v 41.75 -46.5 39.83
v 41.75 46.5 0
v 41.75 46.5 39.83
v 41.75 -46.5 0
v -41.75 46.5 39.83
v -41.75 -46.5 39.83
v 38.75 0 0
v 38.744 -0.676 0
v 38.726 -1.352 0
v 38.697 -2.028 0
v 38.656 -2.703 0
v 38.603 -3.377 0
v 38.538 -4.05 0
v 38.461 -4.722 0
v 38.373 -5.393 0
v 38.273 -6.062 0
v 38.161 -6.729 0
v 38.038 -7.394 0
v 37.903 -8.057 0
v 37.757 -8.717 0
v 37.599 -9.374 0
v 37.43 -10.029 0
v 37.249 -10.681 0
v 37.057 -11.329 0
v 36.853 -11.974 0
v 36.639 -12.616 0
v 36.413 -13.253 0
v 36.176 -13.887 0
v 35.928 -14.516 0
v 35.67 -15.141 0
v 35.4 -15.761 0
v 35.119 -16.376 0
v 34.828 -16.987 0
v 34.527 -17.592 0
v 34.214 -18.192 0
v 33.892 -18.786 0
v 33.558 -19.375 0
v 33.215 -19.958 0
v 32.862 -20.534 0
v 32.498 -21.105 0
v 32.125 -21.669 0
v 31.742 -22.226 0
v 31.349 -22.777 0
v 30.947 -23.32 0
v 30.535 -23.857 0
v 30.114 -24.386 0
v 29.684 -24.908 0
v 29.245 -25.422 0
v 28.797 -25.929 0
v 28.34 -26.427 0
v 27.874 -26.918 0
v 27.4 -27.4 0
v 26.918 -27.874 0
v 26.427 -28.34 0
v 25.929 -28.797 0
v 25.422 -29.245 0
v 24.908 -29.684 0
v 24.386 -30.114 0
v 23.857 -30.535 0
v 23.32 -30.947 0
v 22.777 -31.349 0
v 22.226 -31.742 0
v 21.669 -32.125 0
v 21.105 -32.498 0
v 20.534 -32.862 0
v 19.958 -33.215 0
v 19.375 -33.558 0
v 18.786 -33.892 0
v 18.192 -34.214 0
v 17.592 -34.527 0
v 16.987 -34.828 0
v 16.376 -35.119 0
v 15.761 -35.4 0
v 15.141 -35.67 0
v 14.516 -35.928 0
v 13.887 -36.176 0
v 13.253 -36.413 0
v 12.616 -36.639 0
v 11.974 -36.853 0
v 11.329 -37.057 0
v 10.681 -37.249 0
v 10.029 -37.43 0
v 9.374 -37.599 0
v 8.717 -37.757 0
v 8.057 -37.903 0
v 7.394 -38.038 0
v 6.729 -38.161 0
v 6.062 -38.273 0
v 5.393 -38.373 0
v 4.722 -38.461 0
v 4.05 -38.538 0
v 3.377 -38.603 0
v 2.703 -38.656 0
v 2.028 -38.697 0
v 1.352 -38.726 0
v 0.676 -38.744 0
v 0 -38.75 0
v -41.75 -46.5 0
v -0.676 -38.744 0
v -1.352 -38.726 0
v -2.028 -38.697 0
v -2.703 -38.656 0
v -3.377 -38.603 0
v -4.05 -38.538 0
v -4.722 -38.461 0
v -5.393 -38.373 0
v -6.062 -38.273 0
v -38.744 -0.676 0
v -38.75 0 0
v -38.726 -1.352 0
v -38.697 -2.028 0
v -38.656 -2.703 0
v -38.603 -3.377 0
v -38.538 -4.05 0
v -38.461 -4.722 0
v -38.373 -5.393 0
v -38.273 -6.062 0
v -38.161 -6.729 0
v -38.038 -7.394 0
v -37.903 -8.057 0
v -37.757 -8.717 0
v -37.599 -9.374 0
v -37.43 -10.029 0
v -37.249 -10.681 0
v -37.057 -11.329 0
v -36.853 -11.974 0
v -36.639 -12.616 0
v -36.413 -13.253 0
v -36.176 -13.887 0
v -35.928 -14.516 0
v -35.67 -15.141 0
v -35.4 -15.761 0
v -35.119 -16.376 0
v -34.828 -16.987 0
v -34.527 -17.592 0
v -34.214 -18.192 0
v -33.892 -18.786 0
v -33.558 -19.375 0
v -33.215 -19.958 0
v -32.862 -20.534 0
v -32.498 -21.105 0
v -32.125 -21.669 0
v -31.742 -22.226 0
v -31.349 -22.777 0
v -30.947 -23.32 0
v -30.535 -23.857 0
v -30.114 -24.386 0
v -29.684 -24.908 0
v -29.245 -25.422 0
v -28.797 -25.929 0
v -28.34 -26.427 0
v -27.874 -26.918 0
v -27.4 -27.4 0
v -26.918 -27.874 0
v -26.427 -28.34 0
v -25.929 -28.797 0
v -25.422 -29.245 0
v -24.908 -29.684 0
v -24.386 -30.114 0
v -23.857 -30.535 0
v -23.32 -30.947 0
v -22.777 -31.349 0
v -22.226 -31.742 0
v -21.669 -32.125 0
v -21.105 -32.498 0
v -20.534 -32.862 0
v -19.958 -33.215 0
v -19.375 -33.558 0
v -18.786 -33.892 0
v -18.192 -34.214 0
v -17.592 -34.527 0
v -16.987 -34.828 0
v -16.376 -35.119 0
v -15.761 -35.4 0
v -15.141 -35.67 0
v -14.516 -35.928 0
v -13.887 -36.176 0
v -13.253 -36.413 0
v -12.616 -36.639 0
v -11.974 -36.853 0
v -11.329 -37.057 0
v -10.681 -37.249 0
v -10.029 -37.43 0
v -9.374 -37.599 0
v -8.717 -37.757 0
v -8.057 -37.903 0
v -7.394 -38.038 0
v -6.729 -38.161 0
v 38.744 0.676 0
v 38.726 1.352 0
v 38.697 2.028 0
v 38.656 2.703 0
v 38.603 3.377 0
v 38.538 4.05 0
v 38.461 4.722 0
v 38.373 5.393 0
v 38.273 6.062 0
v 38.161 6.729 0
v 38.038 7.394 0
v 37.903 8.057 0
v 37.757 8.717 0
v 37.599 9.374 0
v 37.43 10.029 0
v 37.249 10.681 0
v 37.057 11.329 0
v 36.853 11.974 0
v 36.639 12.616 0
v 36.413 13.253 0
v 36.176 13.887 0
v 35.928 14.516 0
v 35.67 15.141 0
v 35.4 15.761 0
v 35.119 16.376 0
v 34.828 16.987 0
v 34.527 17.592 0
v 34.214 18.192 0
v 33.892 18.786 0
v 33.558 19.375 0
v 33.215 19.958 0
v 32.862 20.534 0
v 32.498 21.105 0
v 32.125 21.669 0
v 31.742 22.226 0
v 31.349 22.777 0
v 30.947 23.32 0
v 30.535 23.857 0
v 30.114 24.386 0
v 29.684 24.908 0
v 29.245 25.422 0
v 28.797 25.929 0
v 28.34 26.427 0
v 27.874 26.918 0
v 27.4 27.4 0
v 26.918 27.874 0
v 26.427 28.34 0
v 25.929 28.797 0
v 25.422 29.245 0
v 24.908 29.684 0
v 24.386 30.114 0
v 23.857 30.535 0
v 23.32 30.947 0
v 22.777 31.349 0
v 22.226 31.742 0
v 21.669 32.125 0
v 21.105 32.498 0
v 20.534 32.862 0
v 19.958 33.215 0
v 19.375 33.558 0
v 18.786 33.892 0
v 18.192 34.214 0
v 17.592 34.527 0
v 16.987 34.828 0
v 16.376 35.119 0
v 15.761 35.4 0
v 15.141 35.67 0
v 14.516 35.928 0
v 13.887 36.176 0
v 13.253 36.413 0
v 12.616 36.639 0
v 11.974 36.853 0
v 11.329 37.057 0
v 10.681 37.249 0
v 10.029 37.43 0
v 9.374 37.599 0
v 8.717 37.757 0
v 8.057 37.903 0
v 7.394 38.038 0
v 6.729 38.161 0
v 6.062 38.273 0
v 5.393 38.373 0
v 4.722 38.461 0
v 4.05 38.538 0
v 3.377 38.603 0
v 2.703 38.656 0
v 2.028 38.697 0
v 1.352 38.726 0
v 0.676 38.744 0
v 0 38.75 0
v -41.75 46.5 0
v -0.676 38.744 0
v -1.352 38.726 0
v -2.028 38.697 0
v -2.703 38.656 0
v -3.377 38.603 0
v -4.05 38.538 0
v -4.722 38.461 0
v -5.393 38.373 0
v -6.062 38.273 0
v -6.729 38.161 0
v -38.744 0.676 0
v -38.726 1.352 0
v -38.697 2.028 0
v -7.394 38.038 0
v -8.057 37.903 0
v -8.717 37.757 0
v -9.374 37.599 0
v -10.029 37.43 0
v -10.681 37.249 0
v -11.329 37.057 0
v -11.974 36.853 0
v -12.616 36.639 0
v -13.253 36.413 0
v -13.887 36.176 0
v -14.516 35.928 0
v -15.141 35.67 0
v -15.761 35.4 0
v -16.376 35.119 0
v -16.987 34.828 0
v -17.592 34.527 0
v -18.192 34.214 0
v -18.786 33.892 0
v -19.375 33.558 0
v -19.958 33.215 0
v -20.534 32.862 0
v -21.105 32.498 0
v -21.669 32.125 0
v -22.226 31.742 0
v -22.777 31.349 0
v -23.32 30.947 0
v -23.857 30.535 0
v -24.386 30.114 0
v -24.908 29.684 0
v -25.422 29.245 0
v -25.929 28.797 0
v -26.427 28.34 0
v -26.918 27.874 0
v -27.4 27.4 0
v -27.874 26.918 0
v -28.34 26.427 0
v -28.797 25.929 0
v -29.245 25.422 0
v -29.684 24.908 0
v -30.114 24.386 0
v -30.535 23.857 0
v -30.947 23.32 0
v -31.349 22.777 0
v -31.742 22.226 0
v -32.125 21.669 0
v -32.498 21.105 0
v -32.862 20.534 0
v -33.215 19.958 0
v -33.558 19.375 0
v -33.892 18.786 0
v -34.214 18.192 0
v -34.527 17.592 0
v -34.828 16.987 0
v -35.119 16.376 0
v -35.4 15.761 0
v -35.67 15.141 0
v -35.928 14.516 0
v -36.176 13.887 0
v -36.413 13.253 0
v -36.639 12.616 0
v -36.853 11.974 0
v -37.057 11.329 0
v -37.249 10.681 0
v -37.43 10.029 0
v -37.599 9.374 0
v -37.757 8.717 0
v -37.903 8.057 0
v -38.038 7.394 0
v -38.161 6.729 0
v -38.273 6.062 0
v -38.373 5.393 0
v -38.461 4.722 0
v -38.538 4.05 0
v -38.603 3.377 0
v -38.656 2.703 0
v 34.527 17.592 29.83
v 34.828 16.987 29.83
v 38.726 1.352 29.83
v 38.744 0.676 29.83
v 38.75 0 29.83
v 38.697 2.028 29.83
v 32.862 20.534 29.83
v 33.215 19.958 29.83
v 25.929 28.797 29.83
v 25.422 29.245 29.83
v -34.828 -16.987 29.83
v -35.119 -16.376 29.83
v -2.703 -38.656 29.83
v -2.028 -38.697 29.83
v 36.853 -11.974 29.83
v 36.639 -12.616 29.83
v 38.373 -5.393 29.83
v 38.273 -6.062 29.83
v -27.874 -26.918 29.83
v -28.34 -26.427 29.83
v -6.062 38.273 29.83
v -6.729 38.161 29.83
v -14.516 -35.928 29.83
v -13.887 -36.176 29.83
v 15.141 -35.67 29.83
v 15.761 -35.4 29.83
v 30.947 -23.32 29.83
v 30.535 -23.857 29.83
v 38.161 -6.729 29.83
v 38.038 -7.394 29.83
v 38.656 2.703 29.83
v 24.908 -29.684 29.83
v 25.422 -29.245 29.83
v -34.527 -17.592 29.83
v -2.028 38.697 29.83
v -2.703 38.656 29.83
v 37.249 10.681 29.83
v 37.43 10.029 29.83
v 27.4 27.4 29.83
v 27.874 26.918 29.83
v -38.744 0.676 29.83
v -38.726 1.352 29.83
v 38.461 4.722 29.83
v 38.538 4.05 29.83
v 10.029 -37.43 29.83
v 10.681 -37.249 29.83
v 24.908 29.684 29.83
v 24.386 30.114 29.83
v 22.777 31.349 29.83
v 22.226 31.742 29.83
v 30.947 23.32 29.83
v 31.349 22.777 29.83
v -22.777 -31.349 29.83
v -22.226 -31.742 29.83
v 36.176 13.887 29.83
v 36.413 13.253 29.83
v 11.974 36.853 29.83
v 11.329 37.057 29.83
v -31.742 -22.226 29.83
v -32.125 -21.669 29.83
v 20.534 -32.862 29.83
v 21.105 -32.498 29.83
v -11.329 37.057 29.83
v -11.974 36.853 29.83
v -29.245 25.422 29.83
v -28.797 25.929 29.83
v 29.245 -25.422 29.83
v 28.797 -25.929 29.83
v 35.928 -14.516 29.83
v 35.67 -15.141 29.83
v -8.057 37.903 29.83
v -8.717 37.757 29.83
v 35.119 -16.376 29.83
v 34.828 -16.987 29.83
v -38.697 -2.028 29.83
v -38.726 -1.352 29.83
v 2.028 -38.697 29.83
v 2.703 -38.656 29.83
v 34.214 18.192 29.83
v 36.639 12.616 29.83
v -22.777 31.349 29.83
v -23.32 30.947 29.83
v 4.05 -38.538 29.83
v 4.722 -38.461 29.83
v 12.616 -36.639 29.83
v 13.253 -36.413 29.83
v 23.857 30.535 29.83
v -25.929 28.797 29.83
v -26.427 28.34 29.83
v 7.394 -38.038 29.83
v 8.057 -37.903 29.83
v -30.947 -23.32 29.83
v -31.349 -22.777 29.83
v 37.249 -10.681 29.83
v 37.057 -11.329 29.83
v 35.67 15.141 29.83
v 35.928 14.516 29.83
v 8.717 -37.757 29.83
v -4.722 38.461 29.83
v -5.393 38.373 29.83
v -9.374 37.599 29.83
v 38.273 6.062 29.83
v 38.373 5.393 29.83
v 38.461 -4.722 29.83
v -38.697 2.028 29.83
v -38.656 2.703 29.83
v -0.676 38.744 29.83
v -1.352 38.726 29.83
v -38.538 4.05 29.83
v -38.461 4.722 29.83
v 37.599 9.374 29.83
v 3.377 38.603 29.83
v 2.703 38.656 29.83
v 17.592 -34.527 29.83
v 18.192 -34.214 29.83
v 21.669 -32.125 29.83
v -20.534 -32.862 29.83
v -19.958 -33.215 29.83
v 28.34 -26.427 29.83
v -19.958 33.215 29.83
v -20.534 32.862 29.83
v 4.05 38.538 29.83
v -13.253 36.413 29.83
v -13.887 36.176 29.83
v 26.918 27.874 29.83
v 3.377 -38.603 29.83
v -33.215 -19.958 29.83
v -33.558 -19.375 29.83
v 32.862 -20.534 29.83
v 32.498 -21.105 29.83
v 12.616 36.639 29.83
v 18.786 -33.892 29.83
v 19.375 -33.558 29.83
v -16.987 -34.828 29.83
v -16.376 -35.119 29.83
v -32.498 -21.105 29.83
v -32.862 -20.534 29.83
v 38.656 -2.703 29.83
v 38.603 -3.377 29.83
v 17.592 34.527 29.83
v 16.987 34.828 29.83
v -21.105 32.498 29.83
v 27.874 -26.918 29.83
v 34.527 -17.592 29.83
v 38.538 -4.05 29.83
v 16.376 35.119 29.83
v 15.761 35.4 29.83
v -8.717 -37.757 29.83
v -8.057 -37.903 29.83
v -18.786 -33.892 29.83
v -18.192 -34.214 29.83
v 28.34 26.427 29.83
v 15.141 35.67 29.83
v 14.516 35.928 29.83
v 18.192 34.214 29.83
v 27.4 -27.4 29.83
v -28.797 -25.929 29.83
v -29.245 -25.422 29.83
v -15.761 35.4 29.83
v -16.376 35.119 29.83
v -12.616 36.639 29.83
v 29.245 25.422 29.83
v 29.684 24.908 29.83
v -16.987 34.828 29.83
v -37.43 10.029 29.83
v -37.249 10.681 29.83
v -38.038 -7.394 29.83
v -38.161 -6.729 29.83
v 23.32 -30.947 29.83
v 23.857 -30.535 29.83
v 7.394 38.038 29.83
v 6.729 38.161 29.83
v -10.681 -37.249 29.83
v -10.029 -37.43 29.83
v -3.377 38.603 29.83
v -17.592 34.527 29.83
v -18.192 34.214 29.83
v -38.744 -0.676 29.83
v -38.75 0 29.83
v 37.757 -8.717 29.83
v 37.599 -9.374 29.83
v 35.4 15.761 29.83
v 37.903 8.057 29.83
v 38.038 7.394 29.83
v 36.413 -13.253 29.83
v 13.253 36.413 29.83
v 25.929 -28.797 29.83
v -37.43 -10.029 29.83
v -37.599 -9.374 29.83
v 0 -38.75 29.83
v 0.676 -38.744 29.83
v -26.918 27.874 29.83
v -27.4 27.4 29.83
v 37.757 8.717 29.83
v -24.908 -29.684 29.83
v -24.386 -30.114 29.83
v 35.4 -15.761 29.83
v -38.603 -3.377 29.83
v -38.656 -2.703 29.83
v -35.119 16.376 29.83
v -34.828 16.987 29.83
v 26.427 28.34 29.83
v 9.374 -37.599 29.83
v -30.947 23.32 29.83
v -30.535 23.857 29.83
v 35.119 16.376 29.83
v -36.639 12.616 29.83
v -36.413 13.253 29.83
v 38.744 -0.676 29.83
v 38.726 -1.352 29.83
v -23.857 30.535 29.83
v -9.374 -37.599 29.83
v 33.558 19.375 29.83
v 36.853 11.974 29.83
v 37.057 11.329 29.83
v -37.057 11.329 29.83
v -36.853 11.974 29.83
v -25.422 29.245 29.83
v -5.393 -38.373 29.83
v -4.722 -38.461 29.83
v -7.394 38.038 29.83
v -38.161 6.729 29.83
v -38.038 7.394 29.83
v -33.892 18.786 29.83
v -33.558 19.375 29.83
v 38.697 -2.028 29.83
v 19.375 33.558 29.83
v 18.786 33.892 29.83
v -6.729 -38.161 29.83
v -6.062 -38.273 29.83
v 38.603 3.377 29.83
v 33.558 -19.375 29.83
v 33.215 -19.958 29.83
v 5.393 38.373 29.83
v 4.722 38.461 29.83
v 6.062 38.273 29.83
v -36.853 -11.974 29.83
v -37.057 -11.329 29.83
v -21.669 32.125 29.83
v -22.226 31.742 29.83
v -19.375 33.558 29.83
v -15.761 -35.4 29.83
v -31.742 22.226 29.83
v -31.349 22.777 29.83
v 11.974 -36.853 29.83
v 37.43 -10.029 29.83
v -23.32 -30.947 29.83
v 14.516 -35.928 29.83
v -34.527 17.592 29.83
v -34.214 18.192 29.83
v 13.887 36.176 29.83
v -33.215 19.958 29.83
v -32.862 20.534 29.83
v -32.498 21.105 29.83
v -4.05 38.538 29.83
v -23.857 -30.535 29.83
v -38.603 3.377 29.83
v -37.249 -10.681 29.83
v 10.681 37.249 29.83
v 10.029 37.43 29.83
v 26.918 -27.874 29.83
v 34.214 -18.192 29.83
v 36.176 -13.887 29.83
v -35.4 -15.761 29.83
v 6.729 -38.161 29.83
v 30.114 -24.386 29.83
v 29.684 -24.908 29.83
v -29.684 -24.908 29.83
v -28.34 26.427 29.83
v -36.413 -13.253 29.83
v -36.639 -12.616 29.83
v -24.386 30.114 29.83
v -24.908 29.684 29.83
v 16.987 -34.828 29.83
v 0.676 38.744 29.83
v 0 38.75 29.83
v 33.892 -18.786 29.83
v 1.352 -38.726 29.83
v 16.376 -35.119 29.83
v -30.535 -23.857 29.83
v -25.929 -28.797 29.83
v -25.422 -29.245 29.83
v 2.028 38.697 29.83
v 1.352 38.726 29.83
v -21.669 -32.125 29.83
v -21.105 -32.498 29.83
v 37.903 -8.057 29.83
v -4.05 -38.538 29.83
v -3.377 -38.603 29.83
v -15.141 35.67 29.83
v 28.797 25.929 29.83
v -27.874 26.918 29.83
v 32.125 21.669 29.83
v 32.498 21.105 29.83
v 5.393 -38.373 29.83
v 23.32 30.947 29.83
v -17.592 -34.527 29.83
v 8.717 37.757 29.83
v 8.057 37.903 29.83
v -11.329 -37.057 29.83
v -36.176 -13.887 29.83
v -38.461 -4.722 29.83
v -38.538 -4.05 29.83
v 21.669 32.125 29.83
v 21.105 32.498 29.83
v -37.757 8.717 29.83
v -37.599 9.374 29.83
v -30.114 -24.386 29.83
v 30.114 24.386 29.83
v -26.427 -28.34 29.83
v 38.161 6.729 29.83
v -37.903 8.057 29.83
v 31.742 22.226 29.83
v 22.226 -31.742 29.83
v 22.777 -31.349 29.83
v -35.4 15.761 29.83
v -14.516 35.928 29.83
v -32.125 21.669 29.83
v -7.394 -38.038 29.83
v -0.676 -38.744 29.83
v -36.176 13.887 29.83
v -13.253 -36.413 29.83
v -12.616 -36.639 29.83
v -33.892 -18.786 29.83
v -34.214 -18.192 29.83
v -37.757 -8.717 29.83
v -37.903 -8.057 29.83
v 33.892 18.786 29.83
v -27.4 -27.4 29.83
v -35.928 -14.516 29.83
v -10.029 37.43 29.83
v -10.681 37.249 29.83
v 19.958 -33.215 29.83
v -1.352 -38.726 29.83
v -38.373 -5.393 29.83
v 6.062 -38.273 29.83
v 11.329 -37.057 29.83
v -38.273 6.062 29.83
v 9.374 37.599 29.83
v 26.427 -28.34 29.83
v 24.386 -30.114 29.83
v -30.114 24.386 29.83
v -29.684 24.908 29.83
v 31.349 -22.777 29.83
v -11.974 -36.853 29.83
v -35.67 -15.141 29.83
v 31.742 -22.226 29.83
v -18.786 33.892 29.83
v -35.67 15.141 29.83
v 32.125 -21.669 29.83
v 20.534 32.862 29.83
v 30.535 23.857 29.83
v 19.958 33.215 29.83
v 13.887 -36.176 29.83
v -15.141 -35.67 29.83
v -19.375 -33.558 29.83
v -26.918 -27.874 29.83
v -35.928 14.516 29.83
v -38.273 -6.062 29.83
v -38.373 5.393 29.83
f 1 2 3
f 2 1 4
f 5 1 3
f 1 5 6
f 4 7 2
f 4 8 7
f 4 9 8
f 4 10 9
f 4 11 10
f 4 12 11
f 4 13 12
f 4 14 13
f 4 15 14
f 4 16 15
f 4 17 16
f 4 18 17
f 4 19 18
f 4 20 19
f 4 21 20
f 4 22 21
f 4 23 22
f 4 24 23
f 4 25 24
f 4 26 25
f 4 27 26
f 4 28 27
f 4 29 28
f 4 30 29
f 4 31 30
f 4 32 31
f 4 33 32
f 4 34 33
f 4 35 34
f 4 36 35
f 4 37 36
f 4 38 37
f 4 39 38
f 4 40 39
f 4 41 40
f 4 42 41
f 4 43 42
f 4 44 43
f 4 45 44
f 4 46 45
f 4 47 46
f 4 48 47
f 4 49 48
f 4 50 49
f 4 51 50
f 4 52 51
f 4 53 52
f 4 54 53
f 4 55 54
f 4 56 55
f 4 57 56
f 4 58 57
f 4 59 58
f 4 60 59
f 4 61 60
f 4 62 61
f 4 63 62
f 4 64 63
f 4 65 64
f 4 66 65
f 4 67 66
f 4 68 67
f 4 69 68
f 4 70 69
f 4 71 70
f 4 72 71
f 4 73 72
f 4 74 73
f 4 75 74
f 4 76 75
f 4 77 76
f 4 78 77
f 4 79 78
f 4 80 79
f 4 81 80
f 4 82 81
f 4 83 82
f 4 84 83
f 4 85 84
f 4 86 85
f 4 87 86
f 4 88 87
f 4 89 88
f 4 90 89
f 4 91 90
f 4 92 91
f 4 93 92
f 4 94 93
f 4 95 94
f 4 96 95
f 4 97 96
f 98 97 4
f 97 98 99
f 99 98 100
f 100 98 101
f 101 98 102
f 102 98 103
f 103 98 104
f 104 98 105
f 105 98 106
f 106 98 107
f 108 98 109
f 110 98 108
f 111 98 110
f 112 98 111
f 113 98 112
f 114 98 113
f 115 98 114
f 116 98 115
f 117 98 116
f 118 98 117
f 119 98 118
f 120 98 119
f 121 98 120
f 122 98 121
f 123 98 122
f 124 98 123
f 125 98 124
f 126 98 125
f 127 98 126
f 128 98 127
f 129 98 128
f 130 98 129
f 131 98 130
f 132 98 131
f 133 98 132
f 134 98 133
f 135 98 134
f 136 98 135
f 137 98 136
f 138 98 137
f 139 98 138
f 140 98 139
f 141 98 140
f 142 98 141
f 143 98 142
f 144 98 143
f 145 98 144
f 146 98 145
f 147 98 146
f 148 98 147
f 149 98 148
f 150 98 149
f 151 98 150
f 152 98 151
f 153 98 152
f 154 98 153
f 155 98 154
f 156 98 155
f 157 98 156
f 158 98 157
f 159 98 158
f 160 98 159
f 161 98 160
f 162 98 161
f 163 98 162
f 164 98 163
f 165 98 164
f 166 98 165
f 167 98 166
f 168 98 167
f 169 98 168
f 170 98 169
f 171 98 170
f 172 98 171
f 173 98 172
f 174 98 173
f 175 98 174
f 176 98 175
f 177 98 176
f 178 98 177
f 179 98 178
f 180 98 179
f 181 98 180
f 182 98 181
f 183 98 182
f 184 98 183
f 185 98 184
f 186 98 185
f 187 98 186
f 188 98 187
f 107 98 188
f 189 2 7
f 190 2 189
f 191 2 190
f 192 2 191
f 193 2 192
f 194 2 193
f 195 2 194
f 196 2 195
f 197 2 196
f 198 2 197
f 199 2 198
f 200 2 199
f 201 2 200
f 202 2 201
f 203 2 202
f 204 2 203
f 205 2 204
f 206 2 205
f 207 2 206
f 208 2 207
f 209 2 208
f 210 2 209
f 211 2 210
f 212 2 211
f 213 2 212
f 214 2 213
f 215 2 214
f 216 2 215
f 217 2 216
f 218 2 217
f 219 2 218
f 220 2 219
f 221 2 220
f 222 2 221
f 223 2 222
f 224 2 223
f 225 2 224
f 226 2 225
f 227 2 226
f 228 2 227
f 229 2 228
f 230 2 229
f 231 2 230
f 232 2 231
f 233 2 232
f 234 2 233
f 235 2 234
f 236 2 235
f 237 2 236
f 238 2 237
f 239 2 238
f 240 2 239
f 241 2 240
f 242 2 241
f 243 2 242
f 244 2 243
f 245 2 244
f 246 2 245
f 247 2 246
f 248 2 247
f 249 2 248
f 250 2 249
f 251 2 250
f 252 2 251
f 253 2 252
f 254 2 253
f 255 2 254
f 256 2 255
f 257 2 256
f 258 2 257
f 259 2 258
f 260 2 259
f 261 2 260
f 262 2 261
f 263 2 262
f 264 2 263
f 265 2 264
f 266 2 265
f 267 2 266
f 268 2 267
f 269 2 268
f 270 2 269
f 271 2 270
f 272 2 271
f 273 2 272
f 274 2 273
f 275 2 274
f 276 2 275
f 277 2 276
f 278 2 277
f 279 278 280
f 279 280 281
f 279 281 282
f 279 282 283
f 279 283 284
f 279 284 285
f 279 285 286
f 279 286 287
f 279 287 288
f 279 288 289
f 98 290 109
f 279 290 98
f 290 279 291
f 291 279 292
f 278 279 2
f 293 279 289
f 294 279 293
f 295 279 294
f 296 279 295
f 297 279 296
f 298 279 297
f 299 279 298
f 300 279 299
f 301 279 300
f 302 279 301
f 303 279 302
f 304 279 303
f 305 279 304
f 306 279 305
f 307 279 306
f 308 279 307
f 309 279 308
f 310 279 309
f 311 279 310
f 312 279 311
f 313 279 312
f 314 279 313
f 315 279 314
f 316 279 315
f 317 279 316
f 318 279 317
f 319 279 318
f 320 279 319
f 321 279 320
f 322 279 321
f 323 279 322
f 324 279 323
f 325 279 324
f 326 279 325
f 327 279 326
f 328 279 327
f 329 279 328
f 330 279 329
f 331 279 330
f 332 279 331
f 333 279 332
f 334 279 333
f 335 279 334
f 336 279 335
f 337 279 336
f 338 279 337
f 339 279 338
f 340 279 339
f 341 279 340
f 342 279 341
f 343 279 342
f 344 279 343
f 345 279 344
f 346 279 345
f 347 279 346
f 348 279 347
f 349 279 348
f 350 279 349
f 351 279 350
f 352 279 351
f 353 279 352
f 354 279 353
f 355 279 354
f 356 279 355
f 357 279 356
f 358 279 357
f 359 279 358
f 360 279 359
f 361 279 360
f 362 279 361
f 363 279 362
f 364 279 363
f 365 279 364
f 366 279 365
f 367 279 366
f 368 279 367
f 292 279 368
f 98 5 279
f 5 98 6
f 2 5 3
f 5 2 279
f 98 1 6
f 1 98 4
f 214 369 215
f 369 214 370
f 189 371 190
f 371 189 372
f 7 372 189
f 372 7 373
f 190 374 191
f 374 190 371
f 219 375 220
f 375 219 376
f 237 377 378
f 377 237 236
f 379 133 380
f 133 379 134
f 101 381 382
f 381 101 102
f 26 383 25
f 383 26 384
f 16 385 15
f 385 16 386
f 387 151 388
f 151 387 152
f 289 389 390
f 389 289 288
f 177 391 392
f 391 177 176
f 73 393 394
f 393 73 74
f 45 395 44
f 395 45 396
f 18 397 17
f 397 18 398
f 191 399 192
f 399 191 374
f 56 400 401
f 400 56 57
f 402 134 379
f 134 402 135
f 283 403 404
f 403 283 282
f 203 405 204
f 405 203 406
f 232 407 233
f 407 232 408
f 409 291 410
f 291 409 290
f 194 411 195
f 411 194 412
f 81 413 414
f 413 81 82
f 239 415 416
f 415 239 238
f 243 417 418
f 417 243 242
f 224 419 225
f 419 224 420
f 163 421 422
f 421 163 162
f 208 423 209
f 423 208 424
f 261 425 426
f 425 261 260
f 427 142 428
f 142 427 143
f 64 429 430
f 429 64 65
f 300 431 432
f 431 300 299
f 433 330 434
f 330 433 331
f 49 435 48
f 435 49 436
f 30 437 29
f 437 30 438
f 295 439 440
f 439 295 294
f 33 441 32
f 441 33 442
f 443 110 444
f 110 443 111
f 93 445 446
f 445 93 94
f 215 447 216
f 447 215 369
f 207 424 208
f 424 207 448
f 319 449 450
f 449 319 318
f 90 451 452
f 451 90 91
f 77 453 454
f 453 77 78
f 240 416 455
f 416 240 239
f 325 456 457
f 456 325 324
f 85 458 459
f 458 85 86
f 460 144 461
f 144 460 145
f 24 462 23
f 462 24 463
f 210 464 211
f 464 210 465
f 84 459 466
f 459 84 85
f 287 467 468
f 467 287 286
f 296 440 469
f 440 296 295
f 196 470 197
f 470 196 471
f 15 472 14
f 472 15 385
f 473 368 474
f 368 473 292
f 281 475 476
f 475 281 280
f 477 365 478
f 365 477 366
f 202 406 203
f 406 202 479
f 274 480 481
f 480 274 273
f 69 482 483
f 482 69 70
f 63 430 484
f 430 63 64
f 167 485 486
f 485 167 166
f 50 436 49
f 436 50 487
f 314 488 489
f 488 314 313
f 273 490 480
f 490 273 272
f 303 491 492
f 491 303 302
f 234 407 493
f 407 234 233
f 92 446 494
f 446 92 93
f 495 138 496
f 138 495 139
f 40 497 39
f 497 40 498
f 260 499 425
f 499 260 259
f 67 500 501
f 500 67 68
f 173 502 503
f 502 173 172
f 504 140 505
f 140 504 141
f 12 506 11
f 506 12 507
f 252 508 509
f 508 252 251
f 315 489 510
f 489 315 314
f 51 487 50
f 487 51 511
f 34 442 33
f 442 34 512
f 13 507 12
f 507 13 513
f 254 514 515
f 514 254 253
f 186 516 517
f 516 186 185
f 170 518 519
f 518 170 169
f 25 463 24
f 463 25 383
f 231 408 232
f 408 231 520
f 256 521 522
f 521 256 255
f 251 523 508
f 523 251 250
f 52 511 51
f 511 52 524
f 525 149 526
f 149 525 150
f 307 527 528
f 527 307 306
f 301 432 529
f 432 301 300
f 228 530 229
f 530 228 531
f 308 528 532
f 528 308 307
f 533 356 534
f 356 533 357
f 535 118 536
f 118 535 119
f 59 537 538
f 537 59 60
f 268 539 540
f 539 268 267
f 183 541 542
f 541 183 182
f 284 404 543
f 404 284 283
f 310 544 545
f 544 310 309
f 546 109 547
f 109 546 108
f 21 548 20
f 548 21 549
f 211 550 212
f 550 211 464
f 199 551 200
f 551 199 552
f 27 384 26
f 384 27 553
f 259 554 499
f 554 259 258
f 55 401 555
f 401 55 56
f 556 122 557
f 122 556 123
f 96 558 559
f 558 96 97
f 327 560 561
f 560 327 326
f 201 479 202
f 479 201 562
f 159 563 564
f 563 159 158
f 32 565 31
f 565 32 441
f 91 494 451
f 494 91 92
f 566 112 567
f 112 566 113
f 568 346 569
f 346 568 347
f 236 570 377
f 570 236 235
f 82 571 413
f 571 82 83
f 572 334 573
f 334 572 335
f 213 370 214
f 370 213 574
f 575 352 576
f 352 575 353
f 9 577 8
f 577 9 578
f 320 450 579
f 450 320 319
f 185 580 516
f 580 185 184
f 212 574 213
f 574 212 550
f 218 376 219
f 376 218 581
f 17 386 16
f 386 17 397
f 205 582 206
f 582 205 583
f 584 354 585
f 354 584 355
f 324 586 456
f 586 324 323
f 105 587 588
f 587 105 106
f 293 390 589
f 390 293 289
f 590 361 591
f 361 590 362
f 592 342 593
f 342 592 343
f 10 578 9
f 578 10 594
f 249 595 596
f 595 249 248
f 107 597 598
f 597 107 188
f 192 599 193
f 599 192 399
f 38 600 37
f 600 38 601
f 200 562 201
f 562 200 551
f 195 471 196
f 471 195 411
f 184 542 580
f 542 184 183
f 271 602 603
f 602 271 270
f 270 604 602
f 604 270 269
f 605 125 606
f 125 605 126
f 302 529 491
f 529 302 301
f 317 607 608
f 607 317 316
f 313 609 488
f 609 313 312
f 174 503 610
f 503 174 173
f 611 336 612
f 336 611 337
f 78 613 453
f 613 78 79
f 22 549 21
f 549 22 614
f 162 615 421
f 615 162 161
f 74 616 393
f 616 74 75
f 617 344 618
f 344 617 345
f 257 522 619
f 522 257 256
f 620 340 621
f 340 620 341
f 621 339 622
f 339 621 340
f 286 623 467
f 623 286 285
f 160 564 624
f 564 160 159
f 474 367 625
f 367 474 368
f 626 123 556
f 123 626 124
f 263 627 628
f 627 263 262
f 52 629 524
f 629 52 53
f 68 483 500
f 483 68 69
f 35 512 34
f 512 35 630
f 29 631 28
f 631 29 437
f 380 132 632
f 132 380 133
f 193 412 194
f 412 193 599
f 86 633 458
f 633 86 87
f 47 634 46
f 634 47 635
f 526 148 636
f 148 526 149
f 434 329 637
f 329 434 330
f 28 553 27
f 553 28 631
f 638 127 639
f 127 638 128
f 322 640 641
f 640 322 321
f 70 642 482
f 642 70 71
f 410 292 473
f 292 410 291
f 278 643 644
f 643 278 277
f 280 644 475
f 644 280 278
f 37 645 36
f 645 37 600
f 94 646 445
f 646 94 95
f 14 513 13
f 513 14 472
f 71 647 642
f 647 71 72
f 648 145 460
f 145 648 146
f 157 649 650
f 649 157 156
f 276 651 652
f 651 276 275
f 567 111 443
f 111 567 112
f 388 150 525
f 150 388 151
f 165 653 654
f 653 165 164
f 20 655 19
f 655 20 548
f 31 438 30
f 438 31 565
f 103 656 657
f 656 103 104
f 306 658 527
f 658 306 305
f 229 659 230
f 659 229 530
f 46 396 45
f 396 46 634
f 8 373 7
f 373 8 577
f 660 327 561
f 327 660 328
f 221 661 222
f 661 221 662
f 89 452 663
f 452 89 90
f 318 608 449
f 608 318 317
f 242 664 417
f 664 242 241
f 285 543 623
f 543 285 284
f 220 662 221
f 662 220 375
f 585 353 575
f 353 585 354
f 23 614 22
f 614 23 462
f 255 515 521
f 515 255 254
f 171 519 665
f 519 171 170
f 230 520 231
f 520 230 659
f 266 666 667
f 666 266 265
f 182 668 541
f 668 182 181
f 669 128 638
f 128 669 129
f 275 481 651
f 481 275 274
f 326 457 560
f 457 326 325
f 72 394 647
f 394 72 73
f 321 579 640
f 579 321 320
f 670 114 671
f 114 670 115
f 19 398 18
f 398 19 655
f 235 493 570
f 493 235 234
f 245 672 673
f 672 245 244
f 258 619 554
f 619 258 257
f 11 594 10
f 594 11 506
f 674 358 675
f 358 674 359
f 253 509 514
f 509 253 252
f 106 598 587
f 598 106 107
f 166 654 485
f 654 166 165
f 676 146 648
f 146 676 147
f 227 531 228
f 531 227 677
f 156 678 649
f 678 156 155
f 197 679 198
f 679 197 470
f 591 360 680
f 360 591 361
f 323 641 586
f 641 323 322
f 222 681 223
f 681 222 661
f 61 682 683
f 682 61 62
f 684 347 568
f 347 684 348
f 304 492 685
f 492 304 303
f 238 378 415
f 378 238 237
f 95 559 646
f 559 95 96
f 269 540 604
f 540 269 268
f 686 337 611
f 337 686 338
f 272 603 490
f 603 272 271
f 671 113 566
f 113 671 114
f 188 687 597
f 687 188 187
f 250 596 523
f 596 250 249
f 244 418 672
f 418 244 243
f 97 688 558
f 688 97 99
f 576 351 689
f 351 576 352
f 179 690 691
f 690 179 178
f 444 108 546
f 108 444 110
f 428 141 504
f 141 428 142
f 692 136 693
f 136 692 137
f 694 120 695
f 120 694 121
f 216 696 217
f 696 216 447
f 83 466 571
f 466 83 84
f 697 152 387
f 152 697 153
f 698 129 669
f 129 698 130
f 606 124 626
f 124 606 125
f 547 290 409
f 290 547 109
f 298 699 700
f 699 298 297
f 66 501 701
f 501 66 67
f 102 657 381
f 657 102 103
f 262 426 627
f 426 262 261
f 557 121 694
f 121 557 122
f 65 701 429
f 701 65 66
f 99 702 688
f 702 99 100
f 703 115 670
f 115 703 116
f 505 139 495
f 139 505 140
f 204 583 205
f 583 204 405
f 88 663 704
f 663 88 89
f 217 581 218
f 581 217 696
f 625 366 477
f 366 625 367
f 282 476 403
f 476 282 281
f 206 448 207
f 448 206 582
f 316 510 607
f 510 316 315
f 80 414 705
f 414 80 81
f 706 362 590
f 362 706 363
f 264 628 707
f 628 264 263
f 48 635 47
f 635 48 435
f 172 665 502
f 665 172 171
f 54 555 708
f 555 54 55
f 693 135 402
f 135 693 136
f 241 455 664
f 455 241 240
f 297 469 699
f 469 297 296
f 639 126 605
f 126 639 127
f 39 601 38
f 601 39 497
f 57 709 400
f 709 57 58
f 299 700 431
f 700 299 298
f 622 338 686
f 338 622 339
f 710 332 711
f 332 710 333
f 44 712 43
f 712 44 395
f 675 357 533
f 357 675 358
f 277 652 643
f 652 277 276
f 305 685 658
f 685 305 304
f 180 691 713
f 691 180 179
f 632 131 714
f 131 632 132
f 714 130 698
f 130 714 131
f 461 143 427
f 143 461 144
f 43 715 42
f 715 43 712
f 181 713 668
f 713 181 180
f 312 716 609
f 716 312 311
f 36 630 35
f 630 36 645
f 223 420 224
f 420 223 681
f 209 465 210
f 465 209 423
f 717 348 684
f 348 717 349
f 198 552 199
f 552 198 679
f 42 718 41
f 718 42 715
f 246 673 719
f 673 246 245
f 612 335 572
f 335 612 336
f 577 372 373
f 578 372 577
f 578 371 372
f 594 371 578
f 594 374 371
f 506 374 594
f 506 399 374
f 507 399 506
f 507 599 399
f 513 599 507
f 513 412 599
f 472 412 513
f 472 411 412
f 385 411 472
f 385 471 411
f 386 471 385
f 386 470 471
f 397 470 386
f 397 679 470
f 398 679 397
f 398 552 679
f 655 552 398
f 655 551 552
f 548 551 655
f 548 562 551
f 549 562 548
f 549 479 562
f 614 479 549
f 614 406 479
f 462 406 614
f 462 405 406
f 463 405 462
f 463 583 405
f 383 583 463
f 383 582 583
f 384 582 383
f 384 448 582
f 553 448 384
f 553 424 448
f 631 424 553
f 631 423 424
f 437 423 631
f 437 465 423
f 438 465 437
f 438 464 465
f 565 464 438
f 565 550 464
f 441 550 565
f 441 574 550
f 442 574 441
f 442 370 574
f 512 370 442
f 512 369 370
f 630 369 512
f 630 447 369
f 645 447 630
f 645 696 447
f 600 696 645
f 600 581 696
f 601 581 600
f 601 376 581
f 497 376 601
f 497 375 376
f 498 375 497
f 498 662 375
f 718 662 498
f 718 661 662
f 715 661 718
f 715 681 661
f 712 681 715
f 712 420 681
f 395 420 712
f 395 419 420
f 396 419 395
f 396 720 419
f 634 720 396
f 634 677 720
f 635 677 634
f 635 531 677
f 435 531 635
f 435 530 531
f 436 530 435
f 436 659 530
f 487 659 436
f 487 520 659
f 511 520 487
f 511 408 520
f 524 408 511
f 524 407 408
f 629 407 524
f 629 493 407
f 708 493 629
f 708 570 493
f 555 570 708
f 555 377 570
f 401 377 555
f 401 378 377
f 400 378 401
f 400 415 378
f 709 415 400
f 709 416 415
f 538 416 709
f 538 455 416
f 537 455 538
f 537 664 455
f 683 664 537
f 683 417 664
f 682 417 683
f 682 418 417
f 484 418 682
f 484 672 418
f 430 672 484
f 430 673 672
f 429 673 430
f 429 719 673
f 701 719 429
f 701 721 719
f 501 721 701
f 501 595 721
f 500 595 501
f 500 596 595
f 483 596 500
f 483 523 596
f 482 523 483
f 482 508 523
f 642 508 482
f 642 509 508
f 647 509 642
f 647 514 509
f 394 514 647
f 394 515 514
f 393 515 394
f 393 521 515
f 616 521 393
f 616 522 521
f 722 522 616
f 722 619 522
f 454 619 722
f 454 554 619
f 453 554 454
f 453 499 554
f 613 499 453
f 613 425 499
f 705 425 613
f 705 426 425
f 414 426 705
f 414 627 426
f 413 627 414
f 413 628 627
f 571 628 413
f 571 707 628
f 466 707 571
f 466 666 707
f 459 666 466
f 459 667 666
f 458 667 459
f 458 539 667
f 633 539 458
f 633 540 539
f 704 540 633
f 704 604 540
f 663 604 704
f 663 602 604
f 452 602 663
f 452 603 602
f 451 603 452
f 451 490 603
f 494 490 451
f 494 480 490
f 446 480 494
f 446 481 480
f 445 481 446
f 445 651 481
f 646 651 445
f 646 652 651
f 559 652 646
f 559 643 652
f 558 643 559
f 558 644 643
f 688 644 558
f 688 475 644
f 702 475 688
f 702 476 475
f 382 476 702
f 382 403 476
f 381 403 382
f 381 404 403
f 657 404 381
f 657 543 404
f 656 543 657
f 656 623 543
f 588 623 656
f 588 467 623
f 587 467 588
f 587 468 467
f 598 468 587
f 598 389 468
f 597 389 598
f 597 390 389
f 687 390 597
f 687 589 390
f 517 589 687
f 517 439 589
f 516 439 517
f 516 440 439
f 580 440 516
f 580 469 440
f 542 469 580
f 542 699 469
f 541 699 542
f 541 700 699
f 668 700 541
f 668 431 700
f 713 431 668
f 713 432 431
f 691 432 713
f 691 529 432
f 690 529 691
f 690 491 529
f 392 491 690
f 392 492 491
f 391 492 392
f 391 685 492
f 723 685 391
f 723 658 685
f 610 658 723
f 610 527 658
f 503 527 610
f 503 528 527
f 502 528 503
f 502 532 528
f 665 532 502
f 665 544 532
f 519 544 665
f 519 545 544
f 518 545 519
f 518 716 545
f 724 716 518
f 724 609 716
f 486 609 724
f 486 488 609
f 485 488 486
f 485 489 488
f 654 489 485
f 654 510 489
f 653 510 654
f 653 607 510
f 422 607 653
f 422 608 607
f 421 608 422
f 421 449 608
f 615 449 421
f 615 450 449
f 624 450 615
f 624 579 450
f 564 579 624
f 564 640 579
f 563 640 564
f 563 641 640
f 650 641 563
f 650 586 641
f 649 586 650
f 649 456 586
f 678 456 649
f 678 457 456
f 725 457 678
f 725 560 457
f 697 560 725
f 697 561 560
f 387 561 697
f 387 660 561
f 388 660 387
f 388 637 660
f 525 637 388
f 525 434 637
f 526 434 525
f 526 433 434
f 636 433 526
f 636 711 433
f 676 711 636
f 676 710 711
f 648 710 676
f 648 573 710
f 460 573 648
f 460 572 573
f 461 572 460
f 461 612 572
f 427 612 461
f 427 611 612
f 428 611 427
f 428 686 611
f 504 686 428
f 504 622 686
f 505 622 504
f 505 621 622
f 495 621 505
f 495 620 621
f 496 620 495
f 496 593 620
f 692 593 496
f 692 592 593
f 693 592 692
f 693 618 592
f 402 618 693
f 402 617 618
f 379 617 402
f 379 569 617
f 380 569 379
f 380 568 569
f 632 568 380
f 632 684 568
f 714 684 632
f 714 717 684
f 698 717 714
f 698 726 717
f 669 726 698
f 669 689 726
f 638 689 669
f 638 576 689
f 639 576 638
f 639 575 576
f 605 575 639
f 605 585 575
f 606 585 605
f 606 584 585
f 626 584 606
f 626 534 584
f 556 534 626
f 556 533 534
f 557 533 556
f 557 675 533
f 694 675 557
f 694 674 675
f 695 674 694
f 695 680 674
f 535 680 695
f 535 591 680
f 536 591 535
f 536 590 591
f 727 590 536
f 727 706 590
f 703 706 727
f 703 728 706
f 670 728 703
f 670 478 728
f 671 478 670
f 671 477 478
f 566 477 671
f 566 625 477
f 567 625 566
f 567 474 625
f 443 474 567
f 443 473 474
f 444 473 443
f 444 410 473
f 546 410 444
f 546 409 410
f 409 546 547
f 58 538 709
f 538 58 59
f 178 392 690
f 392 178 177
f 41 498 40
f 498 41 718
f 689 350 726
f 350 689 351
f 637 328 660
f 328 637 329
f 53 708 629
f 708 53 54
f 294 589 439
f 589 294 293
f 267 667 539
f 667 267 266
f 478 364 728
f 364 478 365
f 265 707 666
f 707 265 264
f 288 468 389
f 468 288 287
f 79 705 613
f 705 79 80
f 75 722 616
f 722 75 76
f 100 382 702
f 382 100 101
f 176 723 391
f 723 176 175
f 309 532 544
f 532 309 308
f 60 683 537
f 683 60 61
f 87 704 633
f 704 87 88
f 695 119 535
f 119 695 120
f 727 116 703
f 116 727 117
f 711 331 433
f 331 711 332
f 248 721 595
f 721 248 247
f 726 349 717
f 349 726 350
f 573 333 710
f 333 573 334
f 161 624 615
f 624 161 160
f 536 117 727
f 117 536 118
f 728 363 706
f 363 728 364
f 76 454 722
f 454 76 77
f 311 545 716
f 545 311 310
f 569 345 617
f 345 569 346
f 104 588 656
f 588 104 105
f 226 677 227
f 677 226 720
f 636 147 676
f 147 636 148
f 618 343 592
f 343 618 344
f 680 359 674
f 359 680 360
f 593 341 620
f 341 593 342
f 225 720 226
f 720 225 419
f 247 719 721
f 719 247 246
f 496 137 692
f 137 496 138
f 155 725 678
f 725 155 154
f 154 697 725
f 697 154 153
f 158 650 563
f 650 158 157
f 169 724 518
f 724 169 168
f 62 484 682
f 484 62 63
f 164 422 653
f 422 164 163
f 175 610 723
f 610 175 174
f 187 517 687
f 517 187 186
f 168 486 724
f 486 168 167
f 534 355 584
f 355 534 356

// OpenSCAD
// Constants
knobDiameter = 51.50; 
wallWidth = 9; 
knobHeight = 16.5;
diffOffset = 1; 
sightHoleInnerRad=15.5;
sightHoleOuterRad=23.0;
sightHoleOuterRadTop=30.0;
bridgeWidth=11;
nutWidth=5.5; 
nutHeight=2.3;
washerRadius=4.4;
washerHeight=0.8;
screwRadius=2; 
servoLeverRadius=10.43;
servoLeverHeight=6.0; 
screwHeadRadius=3; 

//servoLeverRadius=13.7/2;
servoLeverHeight=6.0; 
servoLeverHoleDist=2.82; 
servoLeverFirstHoleDistFromCenter=6.75; 
servoLeverWidthAtFirstHole=4.25;
servoLeverWidthAt4thHole=3;
servoLeverLength=20;
mountHeight = knobHeight + wallWidth; 

margin=2;
knobRadius = knobDiameter/2; 
mountRadius = knobRadius + wallWidth + margin;

wallThickness=10; 
plateLength=93; 
plateWidth=2*mountRadius + wallThickness;
knobOffset=4.33;

difference() {
    translate(v = [-plateWidth/2, -plateLength/2, 0]) {
        cube([plateWidth, plateLength, mountHeight + wallThickness + knobOffset], center=false);
    }
    cylinder(h = mountHeight + knobOffset, r1 = mountRadius + margin, r2 = mountRadius + margin, center = false, $fn = 360);
}
